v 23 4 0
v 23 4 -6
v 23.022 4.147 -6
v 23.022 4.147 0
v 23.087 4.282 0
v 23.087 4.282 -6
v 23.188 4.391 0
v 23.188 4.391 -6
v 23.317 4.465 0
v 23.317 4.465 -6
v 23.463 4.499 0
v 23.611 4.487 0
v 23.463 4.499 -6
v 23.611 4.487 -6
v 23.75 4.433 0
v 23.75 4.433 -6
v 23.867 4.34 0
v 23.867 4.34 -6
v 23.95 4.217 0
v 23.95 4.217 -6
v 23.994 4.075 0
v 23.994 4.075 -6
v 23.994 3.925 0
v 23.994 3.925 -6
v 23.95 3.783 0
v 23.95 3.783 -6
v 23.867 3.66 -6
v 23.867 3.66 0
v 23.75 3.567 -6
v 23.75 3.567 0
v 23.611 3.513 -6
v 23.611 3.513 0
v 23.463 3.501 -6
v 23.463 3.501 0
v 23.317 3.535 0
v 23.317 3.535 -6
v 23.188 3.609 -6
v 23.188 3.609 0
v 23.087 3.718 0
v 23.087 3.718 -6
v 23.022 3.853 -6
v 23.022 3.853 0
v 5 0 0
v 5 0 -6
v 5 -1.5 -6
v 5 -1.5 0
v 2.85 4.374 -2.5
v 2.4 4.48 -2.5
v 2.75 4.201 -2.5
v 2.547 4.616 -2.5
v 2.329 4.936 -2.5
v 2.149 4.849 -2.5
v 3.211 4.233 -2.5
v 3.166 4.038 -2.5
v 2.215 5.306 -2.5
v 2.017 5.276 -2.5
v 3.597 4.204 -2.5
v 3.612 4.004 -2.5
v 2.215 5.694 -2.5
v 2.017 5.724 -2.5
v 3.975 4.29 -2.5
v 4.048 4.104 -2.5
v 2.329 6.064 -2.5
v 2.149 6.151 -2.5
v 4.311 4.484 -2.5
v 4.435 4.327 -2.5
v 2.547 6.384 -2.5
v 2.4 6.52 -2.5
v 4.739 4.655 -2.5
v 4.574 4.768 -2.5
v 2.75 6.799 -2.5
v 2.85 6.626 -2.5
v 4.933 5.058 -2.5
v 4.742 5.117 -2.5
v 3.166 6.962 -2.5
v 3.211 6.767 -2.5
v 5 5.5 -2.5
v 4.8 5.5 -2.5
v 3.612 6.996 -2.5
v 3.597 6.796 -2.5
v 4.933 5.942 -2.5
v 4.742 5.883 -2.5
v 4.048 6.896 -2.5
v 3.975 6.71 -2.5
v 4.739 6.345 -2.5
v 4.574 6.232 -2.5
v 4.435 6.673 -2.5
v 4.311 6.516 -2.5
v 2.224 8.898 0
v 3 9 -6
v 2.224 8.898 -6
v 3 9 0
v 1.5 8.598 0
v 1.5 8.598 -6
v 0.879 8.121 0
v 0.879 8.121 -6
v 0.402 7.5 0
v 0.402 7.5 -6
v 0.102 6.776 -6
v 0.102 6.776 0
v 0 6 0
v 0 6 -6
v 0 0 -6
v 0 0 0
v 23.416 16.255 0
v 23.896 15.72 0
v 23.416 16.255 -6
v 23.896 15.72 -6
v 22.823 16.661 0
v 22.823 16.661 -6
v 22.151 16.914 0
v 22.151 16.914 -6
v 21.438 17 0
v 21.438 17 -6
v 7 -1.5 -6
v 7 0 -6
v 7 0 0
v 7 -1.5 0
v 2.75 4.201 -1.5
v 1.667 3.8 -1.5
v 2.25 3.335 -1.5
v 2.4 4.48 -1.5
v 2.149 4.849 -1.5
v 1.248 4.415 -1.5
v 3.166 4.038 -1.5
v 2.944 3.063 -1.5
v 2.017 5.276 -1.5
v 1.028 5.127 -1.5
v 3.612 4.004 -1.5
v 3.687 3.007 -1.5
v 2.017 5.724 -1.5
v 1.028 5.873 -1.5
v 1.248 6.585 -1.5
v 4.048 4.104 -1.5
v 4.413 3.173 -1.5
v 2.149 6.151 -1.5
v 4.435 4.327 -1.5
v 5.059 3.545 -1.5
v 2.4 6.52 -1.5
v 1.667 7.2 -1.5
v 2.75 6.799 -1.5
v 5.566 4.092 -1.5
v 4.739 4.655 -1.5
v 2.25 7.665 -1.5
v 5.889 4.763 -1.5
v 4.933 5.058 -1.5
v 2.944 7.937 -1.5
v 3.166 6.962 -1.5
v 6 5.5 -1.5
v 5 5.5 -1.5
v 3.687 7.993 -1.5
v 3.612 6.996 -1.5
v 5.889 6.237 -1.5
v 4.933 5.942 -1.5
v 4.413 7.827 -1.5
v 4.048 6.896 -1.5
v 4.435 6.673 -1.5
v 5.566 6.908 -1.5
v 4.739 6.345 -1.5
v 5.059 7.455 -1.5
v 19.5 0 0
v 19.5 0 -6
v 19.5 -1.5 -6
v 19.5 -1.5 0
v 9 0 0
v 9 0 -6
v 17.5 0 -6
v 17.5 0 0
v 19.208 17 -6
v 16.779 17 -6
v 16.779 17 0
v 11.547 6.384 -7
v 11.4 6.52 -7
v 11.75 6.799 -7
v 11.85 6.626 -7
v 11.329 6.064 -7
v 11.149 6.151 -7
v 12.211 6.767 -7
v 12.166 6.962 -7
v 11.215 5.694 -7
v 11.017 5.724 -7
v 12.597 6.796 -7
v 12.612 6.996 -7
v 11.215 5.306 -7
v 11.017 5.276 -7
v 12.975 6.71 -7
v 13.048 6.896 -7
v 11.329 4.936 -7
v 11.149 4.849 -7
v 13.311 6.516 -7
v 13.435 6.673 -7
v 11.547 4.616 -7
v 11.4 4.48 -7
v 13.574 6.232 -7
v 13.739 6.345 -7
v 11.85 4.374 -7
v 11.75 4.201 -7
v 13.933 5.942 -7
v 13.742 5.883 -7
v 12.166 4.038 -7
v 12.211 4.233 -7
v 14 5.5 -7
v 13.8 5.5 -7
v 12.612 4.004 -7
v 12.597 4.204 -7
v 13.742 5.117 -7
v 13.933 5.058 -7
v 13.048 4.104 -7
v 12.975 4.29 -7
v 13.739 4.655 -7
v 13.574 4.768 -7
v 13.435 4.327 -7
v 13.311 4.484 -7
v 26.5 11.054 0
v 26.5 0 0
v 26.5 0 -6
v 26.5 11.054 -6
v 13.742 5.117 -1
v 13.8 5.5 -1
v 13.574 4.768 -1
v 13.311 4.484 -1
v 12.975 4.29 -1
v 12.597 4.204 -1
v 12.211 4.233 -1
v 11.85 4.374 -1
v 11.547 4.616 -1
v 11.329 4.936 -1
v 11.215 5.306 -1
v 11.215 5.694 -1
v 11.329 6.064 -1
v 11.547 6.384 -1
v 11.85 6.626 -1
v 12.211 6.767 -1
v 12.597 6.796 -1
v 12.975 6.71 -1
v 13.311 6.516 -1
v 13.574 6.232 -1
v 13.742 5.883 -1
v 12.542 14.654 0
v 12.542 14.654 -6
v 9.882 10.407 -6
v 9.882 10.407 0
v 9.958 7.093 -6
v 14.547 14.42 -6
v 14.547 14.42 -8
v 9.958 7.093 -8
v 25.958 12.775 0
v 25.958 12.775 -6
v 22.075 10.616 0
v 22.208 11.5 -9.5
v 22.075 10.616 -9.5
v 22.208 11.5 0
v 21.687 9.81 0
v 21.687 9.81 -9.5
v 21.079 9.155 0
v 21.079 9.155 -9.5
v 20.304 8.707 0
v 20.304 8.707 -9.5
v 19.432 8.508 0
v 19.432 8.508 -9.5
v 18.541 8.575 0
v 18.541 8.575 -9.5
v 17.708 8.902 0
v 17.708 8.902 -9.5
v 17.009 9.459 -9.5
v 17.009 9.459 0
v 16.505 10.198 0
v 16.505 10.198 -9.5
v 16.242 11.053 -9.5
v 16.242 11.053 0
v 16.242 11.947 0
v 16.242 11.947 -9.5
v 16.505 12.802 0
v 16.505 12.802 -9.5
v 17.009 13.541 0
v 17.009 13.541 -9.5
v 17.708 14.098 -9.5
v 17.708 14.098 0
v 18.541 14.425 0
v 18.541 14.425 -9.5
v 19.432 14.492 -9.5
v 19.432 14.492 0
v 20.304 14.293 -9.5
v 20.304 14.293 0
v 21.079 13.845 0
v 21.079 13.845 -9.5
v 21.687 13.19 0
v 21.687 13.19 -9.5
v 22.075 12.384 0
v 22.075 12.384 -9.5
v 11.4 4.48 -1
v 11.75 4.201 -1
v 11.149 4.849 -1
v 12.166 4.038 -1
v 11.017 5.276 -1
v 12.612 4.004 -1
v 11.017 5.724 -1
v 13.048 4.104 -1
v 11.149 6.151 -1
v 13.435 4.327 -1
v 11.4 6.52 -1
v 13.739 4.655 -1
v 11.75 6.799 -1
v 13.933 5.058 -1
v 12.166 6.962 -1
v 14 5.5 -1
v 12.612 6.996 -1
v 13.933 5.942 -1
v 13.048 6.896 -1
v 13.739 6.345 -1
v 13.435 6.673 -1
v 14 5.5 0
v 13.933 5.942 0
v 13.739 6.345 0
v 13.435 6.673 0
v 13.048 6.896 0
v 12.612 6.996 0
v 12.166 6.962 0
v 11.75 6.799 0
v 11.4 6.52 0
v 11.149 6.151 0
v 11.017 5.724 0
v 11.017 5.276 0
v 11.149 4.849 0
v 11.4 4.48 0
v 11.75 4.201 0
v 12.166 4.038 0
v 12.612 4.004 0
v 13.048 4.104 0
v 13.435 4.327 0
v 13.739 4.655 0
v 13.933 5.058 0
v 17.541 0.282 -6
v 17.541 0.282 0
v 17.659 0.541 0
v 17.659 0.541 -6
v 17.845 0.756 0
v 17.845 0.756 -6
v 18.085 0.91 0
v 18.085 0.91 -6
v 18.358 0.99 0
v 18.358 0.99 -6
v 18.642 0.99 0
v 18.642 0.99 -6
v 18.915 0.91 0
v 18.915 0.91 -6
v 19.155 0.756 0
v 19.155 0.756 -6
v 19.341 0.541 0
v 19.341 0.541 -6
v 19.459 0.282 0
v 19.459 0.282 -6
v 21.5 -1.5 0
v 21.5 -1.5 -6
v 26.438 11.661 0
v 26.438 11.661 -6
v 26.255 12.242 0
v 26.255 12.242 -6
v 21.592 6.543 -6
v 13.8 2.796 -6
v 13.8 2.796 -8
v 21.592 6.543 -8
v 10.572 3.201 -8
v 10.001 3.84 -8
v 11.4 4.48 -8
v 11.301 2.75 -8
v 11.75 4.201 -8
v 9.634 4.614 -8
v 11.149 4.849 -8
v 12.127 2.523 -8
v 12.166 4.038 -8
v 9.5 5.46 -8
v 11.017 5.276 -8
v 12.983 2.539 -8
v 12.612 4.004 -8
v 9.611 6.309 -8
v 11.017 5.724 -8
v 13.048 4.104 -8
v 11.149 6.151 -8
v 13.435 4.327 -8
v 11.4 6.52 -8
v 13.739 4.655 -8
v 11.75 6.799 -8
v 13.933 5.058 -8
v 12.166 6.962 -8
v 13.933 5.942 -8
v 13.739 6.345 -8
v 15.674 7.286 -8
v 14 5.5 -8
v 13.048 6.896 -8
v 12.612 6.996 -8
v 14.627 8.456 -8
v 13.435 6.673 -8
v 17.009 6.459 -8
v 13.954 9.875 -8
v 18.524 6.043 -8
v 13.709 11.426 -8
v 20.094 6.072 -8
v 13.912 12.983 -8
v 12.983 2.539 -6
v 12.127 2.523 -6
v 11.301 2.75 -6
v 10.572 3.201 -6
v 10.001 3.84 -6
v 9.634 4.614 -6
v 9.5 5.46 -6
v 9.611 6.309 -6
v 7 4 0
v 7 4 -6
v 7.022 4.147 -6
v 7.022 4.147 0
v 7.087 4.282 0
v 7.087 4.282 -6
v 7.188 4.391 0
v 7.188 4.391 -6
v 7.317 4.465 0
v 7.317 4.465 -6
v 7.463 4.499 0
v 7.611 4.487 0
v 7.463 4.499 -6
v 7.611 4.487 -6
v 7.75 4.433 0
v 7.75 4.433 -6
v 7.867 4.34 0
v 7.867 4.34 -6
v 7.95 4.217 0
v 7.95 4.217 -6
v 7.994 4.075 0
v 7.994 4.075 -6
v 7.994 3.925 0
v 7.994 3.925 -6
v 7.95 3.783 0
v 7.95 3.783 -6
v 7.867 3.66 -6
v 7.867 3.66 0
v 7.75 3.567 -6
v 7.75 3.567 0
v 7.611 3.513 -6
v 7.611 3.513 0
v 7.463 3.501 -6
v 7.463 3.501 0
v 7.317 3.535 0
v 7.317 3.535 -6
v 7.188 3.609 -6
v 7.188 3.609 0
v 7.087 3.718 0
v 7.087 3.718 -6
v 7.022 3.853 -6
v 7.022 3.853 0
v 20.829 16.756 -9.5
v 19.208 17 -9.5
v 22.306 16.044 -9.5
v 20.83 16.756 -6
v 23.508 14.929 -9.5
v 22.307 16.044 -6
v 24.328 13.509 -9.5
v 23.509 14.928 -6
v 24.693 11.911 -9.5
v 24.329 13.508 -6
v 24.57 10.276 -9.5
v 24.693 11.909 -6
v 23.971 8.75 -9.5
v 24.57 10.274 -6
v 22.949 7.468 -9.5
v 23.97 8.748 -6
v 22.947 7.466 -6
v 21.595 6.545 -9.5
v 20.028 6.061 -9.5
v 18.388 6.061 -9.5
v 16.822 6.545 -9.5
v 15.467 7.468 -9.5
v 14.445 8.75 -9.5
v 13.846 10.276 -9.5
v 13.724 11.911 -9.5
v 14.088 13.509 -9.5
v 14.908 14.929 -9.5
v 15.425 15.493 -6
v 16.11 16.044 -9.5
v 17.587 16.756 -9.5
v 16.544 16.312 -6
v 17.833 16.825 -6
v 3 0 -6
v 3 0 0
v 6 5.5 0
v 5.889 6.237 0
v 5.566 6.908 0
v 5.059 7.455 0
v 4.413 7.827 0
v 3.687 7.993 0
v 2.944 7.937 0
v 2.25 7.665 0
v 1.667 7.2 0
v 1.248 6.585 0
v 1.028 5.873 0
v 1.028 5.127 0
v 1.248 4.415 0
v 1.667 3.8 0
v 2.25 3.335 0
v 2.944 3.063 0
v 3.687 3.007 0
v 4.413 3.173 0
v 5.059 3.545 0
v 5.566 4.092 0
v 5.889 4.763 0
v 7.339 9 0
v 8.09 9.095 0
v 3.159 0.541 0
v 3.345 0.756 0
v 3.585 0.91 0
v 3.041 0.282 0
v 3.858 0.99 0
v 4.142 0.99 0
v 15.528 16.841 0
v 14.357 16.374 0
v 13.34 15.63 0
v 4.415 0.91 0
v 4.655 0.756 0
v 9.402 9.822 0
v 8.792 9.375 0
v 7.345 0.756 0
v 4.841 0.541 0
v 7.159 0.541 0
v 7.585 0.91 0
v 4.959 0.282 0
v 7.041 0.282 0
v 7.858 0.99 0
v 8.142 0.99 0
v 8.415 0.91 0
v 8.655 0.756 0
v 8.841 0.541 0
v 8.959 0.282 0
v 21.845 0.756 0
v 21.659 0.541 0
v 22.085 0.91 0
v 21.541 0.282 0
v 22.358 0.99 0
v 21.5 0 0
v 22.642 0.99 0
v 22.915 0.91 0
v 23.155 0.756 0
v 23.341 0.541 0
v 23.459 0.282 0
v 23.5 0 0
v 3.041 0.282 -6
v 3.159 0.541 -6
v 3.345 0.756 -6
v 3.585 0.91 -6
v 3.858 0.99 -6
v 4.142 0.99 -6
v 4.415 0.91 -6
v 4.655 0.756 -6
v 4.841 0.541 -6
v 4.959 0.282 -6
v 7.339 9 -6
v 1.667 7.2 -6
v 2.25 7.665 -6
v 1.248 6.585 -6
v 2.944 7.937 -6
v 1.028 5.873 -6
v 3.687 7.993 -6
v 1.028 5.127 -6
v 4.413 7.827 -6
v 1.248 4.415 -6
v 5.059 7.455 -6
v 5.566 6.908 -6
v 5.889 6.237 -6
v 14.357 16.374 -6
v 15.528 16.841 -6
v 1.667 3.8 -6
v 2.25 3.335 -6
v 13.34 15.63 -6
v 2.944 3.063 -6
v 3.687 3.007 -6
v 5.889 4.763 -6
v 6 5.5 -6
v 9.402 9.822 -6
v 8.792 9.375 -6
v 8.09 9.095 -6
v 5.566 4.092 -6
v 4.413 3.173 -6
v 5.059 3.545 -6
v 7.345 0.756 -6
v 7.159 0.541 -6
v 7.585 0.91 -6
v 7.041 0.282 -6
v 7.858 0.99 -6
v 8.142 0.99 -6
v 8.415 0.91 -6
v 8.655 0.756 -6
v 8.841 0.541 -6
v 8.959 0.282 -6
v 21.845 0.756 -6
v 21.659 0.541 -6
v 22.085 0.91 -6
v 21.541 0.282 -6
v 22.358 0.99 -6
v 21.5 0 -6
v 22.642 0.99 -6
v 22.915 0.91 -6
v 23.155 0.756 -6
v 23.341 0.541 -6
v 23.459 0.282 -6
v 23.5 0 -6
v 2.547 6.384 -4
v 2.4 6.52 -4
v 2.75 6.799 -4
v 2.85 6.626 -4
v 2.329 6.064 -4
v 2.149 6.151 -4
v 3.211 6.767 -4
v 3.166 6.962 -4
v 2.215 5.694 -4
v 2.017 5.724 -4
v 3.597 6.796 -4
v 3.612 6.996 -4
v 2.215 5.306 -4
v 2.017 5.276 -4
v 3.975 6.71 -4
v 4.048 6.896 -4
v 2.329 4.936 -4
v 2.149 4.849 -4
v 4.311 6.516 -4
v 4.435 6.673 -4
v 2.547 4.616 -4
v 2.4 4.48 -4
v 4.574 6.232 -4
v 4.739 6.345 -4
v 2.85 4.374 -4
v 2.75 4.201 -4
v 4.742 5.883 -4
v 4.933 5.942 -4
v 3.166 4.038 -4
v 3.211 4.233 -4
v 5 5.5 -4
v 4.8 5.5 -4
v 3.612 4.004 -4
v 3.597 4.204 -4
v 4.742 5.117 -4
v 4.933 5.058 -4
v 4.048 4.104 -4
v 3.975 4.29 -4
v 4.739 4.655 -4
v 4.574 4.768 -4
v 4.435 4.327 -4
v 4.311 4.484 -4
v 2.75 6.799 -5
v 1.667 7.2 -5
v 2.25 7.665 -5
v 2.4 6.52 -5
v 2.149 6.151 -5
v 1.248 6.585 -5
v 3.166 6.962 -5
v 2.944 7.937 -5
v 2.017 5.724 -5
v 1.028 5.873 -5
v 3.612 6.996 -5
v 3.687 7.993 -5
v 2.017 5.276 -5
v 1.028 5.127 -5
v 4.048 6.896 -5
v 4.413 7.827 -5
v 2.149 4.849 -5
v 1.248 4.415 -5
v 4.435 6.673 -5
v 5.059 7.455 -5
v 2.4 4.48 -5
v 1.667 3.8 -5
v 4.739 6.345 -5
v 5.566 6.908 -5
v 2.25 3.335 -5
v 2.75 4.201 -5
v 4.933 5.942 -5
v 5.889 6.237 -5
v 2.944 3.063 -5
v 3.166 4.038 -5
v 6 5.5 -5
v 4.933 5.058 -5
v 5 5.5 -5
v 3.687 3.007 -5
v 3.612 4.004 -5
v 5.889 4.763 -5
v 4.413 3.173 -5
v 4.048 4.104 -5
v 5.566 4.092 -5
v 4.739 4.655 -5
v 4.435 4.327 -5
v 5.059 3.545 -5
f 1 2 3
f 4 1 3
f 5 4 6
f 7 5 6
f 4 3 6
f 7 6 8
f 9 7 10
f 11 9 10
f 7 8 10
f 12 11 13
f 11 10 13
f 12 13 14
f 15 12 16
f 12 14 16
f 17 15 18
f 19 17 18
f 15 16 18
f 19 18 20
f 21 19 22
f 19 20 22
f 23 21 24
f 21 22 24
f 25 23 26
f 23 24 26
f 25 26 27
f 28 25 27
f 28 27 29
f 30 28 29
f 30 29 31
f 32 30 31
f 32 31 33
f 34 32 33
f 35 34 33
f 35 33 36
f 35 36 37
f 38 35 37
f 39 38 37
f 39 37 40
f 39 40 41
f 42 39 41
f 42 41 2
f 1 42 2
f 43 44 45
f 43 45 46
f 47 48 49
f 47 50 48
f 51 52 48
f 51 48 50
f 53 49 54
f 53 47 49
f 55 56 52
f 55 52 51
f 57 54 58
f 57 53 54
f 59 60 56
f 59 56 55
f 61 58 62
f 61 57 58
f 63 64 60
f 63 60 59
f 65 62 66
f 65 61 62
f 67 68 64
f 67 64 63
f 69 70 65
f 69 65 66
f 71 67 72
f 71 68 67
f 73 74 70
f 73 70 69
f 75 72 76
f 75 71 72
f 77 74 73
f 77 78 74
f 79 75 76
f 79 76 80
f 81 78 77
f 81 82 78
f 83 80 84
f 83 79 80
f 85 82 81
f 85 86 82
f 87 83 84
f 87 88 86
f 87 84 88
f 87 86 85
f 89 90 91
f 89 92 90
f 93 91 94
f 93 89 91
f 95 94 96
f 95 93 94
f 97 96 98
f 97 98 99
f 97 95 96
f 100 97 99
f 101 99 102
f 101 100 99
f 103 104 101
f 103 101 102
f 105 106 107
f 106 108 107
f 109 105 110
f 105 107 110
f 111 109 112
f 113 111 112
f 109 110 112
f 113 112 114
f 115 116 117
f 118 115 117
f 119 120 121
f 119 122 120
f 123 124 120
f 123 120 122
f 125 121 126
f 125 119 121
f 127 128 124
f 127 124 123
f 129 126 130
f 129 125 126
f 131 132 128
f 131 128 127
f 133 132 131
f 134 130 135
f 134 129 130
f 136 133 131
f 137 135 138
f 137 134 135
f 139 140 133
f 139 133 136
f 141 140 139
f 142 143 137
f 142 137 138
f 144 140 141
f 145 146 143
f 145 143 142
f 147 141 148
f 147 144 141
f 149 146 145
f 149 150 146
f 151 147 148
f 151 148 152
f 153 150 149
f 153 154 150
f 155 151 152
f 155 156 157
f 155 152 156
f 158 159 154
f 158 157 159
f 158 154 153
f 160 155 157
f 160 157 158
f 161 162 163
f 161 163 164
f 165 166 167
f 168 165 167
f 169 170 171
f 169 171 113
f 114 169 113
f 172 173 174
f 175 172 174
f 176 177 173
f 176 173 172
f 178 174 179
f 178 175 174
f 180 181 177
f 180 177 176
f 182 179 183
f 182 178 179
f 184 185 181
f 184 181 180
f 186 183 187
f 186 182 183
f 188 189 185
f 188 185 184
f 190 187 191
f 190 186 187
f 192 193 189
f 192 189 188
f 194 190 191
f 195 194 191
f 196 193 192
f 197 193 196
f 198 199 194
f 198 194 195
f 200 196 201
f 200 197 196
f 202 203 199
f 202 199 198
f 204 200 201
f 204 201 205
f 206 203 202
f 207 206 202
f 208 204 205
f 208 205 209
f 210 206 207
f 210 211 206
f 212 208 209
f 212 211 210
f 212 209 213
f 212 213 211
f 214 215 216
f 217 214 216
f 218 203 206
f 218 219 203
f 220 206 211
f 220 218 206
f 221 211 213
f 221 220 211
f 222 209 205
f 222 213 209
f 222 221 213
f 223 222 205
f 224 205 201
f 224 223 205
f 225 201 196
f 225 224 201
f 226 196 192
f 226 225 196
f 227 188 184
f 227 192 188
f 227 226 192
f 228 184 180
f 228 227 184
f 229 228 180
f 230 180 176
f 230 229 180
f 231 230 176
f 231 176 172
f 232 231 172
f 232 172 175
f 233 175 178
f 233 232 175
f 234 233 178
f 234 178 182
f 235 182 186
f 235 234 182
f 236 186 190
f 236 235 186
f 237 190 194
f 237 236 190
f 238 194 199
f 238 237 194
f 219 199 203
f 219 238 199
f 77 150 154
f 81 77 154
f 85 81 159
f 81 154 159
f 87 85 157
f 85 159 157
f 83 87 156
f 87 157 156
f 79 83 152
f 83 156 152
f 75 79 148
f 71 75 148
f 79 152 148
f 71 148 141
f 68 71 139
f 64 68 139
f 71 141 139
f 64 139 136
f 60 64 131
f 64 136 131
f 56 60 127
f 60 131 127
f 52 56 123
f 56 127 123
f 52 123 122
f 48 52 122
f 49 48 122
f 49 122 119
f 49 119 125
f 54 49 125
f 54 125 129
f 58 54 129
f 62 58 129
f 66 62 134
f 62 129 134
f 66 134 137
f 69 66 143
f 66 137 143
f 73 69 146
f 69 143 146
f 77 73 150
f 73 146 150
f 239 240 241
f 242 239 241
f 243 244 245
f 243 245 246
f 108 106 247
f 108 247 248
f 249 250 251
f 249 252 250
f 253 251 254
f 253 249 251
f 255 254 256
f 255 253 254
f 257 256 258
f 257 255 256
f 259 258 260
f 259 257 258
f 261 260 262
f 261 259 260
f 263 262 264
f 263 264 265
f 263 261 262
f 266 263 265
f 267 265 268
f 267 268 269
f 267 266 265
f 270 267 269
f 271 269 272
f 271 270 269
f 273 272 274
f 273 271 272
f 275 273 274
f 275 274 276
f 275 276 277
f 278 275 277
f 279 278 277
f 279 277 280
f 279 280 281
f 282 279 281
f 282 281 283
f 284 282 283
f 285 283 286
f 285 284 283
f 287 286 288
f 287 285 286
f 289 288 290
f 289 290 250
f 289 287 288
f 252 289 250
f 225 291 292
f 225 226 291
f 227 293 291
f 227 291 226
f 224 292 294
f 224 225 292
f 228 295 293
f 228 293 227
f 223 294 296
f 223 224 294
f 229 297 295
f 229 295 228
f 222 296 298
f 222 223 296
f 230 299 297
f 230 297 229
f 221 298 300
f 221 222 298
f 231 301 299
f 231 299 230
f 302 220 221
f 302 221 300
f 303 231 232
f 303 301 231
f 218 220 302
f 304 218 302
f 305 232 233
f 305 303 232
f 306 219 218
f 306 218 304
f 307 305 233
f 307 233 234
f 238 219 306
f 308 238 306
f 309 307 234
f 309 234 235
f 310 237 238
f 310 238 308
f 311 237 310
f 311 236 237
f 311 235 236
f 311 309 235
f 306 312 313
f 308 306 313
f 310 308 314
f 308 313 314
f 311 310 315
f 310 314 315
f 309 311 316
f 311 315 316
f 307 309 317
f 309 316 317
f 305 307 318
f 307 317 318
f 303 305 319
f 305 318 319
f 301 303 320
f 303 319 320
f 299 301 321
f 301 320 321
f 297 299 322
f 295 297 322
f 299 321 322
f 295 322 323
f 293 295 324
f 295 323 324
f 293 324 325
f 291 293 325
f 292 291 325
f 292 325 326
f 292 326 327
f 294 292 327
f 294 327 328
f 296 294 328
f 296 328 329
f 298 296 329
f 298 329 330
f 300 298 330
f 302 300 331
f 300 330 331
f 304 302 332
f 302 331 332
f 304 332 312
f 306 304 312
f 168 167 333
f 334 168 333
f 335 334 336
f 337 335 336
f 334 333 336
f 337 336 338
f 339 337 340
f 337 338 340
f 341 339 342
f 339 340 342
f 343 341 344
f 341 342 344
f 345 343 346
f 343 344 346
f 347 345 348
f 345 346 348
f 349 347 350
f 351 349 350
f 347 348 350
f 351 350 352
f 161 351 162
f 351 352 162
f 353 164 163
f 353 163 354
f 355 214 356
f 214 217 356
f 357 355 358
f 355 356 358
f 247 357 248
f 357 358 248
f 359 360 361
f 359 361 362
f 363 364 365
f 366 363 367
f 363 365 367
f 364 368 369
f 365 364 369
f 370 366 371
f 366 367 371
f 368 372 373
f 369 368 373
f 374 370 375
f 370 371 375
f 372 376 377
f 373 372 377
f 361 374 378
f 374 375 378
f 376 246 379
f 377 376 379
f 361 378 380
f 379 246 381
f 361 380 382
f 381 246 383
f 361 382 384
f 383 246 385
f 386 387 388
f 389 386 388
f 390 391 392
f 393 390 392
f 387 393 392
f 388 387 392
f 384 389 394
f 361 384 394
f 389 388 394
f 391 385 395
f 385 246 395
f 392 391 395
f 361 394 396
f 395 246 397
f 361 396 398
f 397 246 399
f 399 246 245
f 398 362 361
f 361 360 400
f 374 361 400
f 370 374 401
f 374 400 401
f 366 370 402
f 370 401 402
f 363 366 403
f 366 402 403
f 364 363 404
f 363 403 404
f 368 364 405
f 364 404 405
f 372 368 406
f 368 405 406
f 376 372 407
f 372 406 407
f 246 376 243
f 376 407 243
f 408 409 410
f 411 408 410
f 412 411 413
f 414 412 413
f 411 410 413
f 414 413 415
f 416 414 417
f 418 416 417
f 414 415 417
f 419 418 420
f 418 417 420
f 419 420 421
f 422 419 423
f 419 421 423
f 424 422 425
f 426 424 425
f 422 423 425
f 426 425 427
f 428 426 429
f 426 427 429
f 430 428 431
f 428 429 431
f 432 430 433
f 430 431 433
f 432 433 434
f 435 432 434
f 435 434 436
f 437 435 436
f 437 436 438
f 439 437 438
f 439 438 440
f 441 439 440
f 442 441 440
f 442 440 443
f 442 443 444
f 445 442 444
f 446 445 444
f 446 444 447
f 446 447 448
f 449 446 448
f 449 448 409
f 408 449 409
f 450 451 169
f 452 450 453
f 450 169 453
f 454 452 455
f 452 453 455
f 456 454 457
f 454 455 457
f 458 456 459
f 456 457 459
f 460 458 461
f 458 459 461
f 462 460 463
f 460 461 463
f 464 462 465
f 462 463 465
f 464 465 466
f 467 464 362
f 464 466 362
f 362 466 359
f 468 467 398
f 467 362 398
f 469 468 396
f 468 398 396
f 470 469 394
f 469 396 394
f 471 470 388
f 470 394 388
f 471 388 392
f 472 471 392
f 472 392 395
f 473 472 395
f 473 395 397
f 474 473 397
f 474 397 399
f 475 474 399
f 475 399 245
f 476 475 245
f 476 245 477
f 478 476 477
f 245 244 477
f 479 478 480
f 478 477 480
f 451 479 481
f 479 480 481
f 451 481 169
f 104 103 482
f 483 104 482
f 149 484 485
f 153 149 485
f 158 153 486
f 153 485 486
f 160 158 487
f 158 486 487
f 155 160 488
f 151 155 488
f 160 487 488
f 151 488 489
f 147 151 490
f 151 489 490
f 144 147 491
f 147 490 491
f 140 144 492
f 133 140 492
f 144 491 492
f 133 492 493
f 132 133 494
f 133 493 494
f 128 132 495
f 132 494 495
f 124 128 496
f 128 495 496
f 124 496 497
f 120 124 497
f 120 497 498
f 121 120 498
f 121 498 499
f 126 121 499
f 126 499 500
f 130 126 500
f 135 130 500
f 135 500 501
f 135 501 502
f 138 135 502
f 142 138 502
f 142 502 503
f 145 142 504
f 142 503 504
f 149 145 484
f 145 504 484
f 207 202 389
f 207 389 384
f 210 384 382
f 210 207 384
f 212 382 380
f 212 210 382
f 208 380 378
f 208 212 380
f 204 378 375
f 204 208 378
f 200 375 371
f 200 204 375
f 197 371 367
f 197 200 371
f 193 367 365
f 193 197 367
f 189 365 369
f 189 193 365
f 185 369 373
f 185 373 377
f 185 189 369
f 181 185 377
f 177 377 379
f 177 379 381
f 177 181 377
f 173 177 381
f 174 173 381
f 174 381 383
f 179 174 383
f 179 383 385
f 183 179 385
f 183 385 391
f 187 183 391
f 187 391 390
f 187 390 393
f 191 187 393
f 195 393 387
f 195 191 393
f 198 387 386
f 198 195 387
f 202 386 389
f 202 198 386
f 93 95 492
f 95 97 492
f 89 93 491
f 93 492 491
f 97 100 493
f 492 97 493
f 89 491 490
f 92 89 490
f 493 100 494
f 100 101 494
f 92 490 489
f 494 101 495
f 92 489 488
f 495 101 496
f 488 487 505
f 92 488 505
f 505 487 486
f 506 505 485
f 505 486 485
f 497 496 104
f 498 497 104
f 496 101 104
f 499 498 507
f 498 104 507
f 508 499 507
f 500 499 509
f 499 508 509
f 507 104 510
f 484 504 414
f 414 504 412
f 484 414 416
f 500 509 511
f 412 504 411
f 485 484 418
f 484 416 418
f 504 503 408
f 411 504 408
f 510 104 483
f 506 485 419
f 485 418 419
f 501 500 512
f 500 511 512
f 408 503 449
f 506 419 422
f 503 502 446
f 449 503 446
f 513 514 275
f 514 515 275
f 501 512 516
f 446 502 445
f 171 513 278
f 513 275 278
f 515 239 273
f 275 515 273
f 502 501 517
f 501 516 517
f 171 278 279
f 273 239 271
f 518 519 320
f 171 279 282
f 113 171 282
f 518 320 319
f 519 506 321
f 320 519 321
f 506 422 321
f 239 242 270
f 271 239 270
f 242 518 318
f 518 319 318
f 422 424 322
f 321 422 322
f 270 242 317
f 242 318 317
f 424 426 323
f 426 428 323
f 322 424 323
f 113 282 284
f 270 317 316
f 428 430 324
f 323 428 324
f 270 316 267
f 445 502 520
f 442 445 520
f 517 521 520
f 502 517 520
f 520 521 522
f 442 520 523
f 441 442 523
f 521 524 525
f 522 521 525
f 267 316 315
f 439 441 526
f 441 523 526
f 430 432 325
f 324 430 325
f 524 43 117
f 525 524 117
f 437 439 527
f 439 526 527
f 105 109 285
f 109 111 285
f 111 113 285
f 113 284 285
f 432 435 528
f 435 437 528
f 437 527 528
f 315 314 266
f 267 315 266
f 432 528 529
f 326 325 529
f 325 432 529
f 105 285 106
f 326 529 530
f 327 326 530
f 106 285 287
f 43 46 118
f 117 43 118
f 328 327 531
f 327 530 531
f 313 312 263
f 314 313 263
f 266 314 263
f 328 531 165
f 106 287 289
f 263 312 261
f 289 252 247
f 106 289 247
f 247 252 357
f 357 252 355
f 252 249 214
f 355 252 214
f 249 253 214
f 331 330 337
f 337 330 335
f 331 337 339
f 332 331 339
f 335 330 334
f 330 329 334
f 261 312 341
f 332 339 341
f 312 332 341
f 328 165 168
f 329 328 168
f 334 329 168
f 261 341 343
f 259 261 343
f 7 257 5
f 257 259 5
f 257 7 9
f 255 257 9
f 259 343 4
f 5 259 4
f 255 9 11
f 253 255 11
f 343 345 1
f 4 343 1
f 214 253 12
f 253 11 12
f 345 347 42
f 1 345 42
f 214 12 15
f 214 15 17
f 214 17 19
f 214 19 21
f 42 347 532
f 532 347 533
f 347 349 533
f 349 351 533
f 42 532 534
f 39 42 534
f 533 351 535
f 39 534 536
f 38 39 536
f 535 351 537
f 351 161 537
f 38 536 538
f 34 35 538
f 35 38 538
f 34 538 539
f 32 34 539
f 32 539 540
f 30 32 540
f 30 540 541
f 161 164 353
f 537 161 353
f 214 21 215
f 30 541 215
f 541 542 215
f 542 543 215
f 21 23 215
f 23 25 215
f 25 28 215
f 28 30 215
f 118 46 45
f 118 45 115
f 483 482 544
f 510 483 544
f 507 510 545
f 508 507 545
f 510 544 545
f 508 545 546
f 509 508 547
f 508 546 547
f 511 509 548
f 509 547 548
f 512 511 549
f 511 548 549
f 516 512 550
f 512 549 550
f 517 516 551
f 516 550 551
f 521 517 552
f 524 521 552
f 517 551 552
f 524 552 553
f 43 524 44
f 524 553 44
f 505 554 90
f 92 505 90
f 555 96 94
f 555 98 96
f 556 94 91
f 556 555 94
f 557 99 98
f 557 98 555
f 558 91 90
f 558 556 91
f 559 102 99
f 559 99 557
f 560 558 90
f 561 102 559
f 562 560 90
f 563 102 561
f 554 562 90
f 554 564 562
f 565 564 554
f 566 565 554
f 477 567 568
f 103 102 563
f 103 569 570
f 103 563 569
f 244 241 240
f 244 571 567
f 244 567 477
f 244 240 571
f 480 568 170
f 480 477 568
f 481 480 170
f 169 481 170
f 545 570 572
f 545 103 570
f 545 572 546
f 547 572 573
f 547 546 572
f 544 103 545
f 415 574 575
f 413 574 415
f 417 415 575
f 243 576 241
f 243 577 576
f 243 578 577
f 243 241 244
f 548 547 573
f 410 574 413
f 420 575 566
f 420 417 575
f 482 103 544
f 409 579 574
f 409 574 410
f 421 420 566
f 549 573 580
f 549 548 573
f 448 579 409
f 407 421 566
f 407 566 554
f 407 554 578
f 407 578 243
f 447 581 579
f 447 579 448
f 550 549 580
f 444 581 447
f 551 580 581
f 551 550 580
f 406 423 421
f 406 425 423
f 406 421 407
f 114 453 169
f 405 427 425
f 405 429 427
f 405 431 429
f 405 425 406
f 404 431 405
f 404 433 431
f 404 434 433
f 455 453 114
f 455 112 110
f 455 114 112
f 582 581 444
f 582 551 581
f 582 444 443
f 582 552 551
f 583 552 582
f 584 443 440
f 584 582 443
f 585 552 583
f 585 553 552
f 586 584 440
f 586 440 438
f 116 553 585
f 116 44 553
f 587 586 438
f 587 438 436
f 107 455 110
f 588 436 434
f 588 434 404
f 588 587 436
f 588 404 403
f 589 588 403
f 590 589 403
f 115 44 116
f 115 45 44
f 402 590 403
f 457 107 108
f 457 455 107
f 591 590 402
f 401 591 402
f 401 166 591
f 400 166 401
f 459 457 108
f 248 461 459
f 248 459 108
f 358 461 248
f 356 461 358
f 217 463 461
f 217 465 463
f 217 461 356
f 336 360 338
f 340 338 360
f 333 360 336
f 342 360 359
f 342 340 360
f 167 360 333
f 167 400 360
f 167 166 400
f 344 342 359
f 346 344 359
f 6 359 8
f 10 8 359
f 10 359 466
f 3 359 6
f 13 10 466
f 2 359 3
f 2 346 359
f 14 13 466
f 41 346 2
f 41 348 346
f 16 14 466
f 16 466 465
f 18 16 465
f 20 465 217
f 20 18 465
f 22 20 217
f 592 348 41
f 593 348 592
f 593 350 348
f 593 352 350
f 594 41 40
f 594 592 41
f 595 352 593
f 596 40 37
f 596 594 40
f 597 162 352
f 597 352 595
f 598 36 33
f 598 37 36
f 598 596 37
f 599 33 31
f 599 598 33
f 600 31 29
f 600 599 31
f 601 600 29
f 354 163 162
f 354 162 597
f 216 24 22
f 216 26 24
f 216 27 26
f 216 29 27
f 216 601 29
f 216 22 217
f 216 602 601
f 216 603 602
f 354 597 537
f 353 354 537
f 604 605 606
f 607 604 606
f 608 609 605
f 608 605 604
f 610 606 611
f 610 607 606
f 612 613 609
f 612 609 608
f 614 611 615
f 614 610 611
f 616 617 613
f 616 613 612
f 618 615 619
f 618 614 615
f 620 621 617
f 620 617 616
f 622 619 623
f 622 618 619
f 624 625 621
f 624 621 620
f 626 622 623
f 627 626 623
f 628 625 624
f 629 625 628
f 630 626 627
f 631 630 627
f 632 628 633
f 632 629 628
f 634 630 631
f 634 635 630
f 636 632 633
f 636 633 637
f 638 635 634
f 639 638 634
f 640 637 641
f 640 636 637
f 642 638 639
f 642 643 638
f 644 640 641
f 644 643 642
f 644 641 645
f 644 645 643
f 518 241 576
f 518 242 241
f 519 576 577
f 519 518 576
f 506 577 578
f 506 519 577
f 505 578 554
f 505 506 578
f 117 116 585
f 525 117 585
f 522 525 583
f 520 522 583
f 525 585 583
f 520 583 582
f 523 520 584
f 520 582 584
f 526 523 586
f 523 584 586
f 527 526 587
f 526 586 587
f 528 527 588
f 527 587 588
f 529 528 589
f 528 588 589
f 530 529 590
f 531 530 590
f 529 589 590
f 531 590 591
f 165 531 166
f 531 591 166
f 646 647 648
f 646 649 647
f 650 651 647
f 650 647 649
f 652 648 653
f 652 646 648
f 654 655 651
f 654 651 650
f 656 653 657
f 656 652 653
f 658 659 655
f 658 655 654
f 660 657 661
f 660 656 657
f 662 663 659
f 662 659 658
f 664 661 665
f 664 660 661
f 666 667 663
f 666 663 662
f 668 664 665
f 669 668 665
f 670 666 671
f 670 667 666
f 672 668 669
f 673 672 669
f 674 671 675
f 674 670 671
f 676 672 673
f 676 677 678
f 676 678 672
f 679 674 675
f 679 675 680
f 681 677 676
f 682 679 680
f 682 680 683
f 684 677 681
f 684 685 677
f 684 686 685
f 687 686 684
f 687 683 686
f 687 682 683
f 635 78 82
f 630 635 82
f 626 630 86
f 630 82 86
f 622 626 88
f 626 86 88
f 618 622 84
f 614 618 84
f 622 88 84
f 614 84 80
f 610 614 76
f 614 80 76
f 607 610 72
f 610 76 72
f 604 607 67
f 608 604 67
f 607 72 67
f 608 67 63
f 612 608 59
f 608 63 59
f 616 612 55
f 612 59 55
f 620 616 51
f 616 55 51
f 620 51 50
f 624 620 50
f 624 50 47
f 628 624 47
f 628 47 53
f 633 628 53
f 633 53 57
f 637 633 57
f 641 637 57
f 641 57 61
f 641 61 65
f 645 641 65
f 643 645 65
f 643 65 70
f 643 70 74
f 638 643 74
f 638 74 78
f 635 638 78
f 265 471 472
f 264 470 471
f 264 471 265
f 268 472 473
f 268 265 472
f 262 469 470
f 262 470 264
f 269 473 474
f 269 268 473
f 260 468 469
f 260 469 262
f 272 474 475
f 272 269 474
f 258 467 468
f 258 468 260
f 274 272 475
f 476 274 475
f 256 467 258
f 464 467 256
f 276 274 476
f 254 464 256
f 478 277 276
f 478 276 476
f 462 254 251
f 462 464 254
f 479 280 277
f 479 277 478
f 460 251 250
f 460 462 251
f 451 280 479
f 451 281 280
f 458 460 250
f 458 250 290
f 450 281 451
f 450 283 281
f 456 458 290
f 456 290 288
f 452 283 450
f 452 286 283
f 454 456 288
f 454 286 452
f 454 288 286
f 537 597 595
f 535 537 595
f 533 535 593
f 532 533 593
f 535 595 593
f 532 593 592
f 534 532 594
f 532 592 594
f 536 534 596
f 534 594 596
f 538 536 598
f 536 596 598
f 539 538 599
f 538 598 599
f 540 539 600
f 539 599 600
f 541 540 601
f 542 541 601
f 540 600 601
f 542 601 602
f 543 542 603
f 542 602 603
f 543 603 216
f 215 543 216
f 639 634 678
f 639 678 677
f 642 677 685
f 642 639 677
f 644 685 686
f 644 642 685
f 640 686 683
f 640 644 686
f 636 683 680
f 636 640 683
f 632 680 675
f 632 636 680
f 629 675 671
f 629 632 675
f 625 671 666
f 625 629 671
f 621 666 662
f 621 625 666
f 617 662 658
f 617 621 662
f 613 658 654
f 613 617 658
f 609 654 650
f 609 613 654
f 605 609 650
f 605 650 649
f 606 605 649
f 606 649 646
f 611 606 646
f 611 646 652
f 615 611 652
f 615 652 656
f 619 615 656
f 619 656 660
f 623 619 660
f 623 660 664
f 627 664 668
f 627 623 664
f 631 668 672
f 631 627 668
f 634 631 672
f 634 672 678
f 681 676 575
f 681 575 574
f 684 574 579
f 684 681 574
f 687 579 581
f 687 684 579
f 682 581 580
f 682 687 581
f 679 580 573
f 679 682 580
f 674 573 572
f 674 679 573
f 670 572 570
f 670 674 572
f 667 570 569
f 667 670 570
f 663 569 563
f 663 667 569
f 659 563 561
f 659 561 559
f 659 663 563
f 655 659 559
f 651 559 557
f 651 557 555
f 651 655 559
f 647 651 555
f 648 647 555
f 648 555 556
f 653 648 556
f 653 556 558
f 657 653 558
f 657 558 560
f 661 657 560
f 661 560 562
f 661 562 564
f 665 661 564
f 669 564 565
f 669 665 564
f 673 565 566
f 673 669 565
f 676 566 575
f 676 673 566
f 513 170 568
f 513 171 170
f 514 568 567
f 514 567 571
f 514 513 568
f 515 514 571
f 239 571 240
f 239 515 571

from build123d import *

# Parameters (mm, degrees)
SKETCH1_W                       = 26.5
SKETCH1_H                       = 6
BOSS_EXTRUDE1_DEPTH             = 17
SKETCH2_R                       = 1.5
CUT_EXTRUDE1_DEPTH              = 1
SKETCH3_R                       = 1.3
CUT_EXTRUDE2_DEPTH              = 32.878676259
SKETCH4_R                       = 3
CUT_EXTRUDE3_DEPTH              = 33.050741021
SKETCH5_R                       = 2.5
CUT_EXTRUDE4_DEPTH              = 1.5
SKETCH6_R                       = 1.5
CUT_EXTRUDE8_DEPTH              = 1
SKETCH7_R                       = 1.3
CUT_EXTRUDE9_DEPTH              = 32.678068123
CUT_EXTRUDE10_START             = -1
SKETCH8_R                       = 2.5
CUT_EXTRUDE10_DEPTH             = 1
CUT_EXTRUDE11_START             = -1
SKETCH9_R                       = 1.5
CUT_EXTRUDE11_DEPTH             = 1
SKETCH10_R                      = 5.5
SKETCH10_R_2                    = 3
BOSS_EXTRUDE2_DEPTH             = 3.5
SKETCH11_R                      = 3
SKETCH11_R_2                    = 1.3
BOSS_EXTRUDE4_DEPTH             = 2
CUT_EXTRUDE12_START             = -1
SKETCH12_R                      = 1.5
CUT_EXTRUDE12_DEPTH             = 1
SKETCH17_W                      = 2
SKETCH17_H                      = 6
BOSS_EXTRUDE6_DEPTH             = 1.5
SKETCH18_R                      = 1
CUT_EXTRUDE17_DEPTH             = 33.050741021
CHAMFER2_SIZE                   = 5
CHAMFER2_SIZE2                  = 3.5
FILLET11_R                      = 3
BOSS_EXTRUDE7_DEPTH             = 2
CUT_EXTRUDE19_DEPTH             = 33.050741021
FILLET13_R                      = 5
FILLET14_R                      = 3
FILLET15_R                      = 3
SKIZZE1_R                       = 0.5
SCHNITT_LINEAR_AUSTRAGEN1_DEPTH = 33.050741021


with BuildPart() as part:
    # Sketch1 → Boss-Extrude1 (new body)
    with BuildSketch(Plane(origin=(0, 0, 0), x_dir=(1, 0, 0), z_dir=(0, 1, 0))):
        with Locations((13.25, 3)):
            Rectangle(SKETCH1_W, SKETCH1_H)
    extrude(amount=BOSS_EXTRUDE1_DEPTH)

    # Sketch2 → Cut-Extrude1 (cut)
    with BuildSketch(Plane.XY):
        with Locations((12.5, 5.5)):
            Circle(SKETCH2_R)
    extrude(amount=-CUT_EXTRUDE1_DEPTH, mode=Mode.SUBTRACT)

    # Sketch3 → Cut-Extrude2 (cut, through all)
    with BuildSketch(Plane.XY.offset(-1)):
        with Locations((12.5, 5.5)):
            Circle(SKETCH3_R)
    extrude(amount=-CUT_EXTRUDE2_DEPTH, mode=Mode.SUBTRACT)

    # Sketch4 → Cut-Extrude3 (cut, through all)
    with BuildSketch(Plane.XY):
        with Locations((19.208203932, 11.5)):
            Circle(SKETCH4_R)
    extrude(amount=-CUT_EXTRUDE3_DEPTH, mode=Mode.SUBTRACT)

    # Sketch5 → Cut-Extrude4 (cut)
    with BuildSketch(Plane.XY):
        with Locations((3.5, 5.5)):
            Circle(SKETCH5_R)
    extrude(amount=-CUT_EXTRUDE4_DEPTH, mode=Mode.SUBTRACT)

    # Sketch6 → Cut-Extrude8 (cut)
    with BuildSketch(Plane.XY.offset(-1.5)):
        with Locations((3.5, 5.5)):
            Circle(SKETCH6_R)
    extrude(amount=-CUT_EXTRUDE8_DEPTH, mode=Mode.SUBTRACT)

    # Sketch7 → Cut-Extrude9 (cut, through all)
    with BuildSketch(Plane.XY.offset(-2.5)):
        with Locations((3.5, 5.5)):
            Circle(SKETCH7_R)
    extrude(amount=-CUT_EXTRUDE9_DEPTH, mode=Mode.SUBTRACT)

    # Sketch8 → Cut-Extrude10 (cut)
    with BuildSketch(Plane(origin=(0, 0, -6), x_dir=(-1, 0, 0), z_dir=(0, 0, -1)).offset(CUT_EXTRUDE10_START)):
        with Locations(Location((-3.5, 5.5, 0), (0, 0, 180))):
            Circle(SKETCH8_R)
    extrude(amount=CUT_EXTRUDE10_DEPTH, mode=Mode.SUBTRACT)

    # Sketch9 → Cut-Extrude11 (cut)
    with BuildSketch(Plane(origin=(0, 0, -5), x_dir=(-1, 0, 0), z_dir=(0, 0, -1)).offset(CUT_EXTRUDE11_START)):
        with Locations(Location((-3.5, 5.5, 0), (0, 0, 180))):
            Circle(SKETCH9_R)
    extrude(amount=CUT_EXTRUDE11_DEPTH, mode=Mode.SUBTRACT)

    # Sketch10 → Boss-Extrude2 (add)
    with BuildSketch(Plane(origin=(0, 0, -6), x_dir=(-1, 0, 0), z_dir=(0, 0, -1))):
        with Locations(Location((-19.208203932, 11.5, 0), (0, 0, 90))):
            Circle(SKETCH10_R)
        with Locations(Location((-19.208203932, 11.5, 0), (0, 0, 180))):
            Circle(SKETCH10_R_2, mode=Mode.SUBTRACT)
    extrude(amount=BOSS_EXTRUDE2_DEPTH)

    # Sketch11 → Boss-Extrude4 (add)
    with BuildSketch(Plane(origin=(0, 0, -6), x_dir=(-1, 0, 0), z_dir=(0, 0, -1))):
        with Locations(Location((-12.5, 5.5, 0), (0, 0, 180))):
            Circle(SKETCH11_R)
        with Locations(Location((-12.5, 5.5, 0), (0, 0, 180))):
            Circle(SKETCH11_R_2, mode=Mode.SUBTRACT)
    extrude(amount=BOSS_EXTRUDE4_DEPTH)

    # Sketch12 → Cut-Extrude12 (cut)
    with BuildSketch(Plane(origin=(0, 0, -8), x_dir=(-1, 0, 0), z_dir=(0, 0, -1)).offset(CUT_EXTRUDE12_START)):
        with Locations(Location((-12.5, 5.5, 0), (0, 0, 180))):
            Circle(SKETCH12_R)
    extrude(amount=CUT_EXTRUDE12_DEPTH, mode=Mode.SUBTRACT)

    # Sketch17 → Boss-Extrude6 (add)
    with BuildSketch(Plane.XZ):
        with Locations((6, -3)):
            Rectangle(SKETCH17_W, SKETCH17_H)
        with Locations((20.5, -3)):
            Rectangle(SKETCH17_W, SKETCH17_H)
    extrude(amount=BOSS_EXTRUDE6_DEPTH)

    # Sketch18 → Cut-Extrude17 (cut, through all)
    with BuildSketch(Plane(origin=(0, 0, -6), x_dir=(-1, 0, 0), z_dir=(0, 0, -1))):
        with Locations((-22.5, 0)):
            Circle(SKETCH18_R)
        with Locations((-18.5, 0)):
            Circle(SKETCH18_R)
        with Locations((-8, 0)):
            Circle(SKETCH18_R)
        with Locations((-4, 0)):
            Circle(SKETCH18_R)
    extrude(amount=-CUT_EXTRUDE17_DEPTH, mode=Mode.SUBTRACT)

    # Chamfer2
    chamfer2_edges = [part.edges().sort_by_distance(p)[0] for p in [
        (26.5, 17, -3),
    ]]
    chamfer2_side = [part.faces().sort_by_distance(p)[0] for p in [
        (26.5, 8.5, -3),
    ]]
    chamfer(chamfer2_edges, length=CHAMFER2_SIZE, length2=CHAMFER2_SIZE2, reference=chamfer2_side[0])

    # Fillet11
    fillet11_edges = [part.edges().sort_by_distance(p)[0] for p in [
        (23, 17, -3),
        (26.5, 12, -3),
    ]]
    fillet(fillet11_edges, radius=FILLET11_R)

    # Sketch19 → Boss-Extrude7 (add)
    with BuildSketch(Plane(origin=(0, 0, -6), x_dir=(-1, 0, 0), z_dir=(0, 0, -1))):
        with BuildLine():
            Line((-14.547099294, 14.419606745), (-9.957579288, 7.09251277))
            ThreePointArc((-9.957579288, 7.09251277), (-14.736067977, 7.5), (-13.800160725, 2.796376119))
            Line((-13.800160725, 2.796376119), (-21.591831928, 6.543356218))
            ThreePointArc((-21.591831928, 6.543356218), (-15.108745974, 7.833333333), (-14.547099294, 14.419606745))
        make_face()
    extrude(amount=BOSS_EXTRUDE7_DEPTH)

    # Sketch20 → Cut-Extrude19 (cut, through all)
    with BuildSketch(Plane(origin=(0, 0, -6), x_dir=(-1, 0, 0), z_dir=(0, 0, -1))):
        Polygon((0, 17), (-14.011012575, 17), (-9, 9), (0, 9), align=None)
    extrude(amount=-CUT_EXTRUDE19_DEPTH, mode=Mode.SUBTRACT)

    # Fillet13
    fillet13_edges = [part.edges().sort_by_distance(p)[0] for p in [
        (14.011012575, 17, -3),
    ]]
    fillet(fillet13_edges, radius=FILLET13_R)

    # Fillet14
    fillet14_edges = [part.edges().sort_by_distance(p)[0] for p in [
        (9, 9, -3),
    ]]
    fillet(fillet14_edges, radius=FILLET14_R)

    # Fillet15
    fillet15_edges = [part.edges().sort_by_distance(p)[0] for p in [
        (0, 9, -3),
    ]]
    fillet(fillet15_edges, radius=FILLET15_R)

    # Skizze1 → Schnitt-Linear austragen1 (cut, through all)
    with BuildSketch(Plane(origin=(0, 0, -6), x_dir=(-1, 0, 0), z_dir=(0, 0, -1))):
        with Locations((-23.5, 4)):
            Circle(SKIZZE1_R)
        with Locations((-7.5, 4)):
            Circle(SKIZZE1_R)
    extrude(amount=-SCHNITT_LINEAR_AUSTRAGEN1_DEPTH, mode=Mode.SUBTRACT)


solid = part.part
